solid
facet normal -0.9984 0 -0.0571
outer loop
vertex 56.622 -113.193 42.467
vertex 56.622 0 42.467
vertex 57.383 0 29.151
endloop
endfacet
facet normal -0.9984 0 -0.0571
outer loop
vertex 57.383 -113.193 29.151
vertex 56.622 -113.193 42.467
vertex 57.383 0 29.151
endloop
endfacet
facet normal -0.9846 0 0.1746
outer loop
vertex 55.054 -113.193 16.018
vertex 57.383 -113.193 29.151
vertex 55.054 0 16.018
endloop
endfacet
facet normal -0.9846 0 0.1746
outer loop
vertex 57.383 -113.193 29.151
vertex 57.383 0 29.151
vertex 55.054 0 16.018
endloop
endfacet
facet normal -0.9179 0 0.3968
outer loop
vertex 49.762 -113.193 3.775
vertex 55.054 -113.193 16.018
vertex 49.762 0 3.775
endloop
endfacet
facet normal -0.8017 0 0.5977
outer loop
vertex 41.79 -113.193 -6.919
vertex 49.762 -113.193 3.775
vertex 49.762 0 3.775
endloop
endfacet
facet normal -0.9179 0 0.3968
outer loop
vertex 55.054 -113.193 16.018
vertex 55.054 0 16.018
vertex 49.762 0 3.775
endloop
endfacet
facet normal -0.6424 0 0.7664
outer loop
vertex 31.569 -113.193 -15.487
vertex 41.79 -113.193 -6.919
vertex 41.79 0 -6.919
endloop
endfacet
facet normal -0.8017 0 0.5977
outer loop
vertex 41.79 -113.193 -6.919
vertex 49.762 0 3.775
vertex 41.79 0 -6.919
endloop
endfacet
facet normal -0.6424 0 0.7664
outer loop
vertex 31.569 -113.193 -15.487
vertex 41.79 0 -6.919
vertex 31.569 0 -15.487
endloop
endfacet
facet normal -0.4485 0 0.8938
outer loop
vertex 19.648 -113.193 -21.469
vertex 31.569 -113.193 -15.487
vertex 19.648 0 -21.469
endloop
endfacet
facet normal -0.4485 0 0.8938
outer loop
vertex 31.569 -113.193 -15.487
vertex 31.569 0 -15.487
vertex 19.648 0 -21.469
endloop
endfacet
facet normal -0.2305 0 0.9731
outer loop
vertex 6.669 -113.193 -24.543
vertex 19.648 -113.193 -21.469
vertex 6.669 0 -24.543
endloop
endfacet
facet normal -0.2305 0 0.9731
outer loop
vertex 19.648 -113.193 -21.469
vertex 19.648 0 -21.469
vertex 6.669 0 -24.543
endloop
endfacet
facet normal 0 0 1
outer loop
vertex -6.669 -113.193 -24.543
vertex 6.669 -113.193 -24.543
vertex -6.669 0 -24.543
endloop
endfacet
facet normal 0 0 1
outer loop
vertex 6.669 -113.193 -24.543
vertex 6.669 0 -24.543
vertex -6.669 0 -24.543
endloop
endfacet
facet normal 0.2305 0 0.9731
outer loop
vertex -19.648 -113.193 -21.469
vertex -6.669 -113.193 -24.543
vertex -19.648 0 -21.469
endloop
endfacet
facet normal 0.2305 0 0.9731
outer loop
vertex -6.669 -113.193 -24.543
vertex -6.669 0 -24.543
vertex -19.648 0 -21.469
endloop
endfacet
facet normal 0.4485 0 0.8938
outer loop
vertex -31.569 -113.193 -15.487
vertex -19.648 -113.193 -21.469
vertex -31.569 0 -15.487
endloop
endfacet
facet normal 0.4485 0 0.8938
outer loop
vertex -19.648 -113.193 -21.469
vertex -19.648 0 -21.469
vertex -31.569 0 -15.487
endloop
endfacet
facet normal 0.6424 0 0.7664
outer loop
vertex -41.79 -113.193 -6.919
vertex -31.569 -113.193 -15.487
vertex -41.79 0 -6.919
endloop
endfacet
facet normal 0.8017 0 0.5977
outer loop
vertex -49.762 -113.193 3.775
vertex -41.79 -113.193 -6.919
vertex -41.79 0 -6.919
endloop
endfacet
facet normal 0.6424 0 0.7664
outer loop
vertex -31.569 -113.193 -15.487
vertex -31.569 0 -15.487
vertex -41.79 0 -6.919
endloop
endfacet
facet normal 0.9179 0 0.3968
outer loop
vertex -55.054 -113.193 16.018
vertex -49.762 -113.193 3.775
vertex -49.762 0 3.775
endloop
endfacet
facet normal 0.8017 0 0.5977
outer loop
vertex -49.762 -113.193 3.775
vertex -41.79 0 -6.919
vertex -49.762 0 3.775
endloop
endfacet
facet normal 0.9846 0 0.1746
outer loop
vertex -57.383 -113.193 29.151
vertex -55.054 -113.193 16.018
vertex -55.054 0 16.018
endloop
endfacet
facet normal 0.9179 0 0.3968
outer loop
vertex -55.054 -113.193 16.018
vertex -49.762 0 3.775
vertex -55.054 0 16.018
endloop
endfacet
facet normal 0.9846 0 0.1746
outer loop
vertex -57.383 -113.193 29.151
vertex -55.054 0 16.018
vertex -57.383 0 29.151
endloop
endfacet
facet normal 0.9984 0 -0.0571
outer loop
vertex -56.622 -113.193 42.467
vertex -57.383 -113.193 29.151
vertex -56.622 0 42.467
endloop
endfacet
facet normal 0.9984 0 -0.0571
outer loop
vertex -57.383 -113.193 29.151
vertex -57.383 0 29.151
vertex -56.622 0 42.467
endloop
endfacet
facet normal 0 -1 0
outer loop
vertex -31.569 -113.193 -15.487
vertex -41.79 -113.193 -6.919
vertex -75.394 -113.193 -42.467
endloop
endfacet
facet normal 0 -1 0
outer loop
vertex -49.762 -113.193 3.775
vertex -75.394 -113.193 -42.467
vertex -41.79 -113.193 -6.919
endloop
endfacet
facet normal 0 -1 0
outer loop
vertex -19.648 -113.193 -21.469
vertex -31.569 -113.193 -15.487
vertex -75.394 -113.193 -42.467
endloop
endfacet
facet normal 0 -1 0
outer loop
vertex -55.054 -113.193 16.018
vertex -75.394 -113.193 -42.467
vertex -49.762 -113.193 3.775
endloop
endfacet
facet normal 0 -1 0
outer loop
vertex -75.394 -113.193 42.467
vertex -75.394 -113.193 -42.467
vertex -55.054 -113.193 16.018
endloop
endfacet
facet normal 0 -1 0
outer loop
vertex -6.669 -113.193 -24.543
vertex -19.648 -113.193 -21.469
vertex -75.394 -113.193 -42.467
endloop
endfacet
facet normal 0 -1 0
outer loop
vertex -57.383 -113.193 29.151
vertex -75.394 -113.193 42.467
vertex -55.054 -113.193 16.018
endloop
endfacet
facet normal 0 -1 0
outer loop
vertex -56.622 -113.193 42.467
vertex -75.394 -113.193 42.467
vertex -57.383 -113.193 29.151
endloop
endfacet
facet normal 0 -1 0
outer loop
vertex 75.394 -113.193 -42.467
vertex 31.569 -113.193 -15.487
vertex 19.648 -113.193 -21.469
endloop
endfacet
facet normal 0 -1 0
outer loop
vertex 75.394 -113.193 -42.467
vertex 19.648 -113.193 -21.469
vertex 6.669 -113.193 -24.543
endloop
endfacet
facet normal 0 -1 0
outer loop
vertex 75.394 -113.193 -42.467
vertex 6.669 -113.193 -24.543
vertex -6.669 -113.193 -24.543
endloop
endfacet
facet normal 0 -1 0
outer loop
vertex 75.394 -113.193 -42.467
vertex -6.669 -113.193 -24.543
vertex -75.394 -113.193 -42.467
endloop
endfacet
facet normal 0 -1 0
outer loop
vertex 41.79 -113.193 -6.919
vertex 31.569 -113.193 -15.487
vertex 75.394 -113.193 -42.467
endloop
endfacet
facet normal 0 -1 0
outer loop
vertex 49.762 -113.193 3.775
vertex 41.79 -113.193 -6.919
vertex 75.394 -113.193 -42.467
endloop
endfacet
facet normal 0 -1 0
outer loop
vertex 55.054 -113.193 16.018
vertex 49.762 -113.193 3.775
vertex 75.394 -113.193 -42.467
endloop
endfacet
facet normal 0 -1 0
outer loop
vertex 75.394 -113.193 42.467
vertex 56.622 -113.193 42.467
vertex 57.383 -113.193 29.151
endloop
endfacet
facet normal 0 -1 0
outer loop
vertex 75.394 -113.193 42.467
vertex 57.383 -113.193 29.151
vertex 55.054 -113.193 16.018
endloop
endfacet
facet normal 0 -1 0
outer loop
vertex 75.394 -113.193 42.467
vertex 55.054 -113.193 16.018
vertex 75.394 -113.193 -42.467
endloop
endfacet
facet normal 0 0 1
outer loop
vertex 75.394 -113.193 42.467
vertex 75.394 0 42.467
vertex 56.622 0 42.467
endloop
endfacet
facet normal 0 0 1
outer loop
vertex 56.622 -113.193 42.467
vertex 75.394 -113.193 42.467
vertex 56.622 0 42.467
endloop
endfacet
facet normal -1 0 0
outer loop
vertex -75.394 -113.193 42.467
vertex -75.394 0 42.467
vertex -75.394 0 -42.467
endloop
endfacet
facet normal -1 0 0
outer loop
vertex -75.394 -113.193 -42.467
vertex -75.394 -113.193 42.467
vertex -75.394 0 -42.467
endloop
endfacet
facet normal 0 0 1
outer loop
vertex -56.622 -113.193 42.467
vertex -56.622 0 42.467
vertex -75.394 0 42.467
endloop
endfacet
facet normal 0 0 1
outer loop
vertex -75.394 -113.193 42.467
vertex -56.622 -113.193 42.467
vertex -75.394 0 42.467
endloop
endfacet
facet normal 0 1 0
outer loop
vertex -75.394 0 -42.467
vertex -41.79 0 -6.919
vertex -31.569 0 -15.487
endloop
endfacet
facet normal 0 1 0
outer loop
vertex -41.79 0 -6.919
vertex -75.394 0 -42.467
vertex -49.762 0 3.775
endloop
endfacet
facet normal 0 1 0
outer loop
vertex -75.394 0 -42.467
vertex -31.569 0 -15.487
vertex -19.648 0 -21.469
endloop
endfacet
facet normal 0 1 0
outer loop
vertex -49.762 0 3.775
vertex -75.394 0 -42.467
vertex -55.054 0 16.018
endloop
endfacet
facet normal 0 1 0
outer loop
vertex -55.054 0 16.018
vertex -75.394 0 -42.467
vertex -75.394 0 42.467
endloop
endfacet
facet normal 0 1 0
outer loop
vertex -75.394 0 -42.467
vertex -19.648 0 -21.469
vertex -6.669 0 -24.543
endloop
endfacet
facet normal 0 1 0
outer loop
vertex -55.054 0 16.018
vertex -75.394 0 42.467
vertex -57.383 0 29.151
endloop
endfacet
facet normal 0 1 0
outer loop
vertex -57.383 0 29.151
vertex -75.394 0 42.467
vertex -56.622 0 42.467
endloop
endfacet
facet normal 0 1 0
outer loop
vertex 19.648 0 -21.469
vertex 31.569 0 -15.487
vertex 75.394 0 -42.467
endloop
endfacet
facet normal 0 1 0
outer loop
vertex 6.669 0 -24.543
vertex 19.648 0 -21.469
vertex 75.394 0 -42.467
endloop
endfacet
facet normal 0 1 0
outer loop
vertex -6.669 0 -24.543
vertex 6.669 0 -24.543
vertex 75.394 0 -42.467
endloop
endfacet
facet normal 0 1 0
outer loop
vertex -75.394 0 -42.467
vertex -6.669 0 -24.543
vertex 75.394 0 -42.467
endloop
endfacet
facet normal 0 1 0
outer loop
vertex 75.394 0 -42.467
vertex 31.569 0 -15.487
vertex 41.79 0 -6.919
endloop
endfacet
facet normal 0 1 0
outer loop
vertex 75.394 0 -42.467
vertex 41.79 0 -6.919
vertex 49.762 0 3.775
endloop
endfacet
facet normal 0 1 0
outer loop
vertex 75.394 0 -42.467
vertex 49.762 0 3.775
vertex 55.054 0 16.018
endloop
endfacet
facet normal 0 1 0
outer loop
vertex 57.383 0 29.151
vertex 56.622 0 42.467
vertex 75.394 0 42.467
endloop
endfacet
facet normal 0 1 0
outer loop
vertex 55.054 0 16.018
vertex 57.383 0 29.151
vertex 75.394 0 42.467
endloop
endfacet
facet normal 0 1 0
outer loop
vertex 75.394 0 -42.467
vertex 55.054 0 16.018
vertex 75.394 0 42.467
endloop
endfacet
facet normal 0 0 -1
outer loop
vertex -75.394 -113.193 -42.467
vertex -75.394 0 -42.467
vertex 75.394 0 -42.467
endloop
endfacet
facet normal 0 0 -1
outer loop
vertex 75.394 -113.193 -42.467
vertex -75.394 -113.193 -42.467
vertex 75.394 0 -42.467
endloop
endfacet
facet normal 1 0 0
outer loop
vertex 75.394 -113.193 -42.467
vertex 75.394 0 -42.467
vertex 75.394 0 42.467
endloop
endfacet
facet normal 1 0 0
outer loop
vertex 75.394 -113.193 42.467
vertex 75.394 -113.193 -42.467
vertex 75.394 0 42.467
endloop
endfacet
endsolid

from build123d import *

# Parameters (mm, degrees)
F1_DEPTH = 113.19281


with BuildPart() as f1:
    # F0 (on Front) → F1 (new body)
    with BuildSketch(Plane.XZ):
        with BuildLine():
            Line((75.394042, -42.466845), (75.394042, 42.466845))
            Line((75.394042, 42.466845), (56.622468, 42.466845))
            ThreePointArc((56.622468, 42.466845), (4e-06, -24.931278), (-56.62246, 42.466845))
            Line((-56.62246, 42.466845), (-75.394042, 42.466845))
            Line((-75.394042, 42.466845), (-75.394042, -42.466845))
            Line((-75.394042, -42.466845), (75.394042, -42.466845))
        make_face()
    extrude(amount=F1_DEPTH)


solid = f1.part
